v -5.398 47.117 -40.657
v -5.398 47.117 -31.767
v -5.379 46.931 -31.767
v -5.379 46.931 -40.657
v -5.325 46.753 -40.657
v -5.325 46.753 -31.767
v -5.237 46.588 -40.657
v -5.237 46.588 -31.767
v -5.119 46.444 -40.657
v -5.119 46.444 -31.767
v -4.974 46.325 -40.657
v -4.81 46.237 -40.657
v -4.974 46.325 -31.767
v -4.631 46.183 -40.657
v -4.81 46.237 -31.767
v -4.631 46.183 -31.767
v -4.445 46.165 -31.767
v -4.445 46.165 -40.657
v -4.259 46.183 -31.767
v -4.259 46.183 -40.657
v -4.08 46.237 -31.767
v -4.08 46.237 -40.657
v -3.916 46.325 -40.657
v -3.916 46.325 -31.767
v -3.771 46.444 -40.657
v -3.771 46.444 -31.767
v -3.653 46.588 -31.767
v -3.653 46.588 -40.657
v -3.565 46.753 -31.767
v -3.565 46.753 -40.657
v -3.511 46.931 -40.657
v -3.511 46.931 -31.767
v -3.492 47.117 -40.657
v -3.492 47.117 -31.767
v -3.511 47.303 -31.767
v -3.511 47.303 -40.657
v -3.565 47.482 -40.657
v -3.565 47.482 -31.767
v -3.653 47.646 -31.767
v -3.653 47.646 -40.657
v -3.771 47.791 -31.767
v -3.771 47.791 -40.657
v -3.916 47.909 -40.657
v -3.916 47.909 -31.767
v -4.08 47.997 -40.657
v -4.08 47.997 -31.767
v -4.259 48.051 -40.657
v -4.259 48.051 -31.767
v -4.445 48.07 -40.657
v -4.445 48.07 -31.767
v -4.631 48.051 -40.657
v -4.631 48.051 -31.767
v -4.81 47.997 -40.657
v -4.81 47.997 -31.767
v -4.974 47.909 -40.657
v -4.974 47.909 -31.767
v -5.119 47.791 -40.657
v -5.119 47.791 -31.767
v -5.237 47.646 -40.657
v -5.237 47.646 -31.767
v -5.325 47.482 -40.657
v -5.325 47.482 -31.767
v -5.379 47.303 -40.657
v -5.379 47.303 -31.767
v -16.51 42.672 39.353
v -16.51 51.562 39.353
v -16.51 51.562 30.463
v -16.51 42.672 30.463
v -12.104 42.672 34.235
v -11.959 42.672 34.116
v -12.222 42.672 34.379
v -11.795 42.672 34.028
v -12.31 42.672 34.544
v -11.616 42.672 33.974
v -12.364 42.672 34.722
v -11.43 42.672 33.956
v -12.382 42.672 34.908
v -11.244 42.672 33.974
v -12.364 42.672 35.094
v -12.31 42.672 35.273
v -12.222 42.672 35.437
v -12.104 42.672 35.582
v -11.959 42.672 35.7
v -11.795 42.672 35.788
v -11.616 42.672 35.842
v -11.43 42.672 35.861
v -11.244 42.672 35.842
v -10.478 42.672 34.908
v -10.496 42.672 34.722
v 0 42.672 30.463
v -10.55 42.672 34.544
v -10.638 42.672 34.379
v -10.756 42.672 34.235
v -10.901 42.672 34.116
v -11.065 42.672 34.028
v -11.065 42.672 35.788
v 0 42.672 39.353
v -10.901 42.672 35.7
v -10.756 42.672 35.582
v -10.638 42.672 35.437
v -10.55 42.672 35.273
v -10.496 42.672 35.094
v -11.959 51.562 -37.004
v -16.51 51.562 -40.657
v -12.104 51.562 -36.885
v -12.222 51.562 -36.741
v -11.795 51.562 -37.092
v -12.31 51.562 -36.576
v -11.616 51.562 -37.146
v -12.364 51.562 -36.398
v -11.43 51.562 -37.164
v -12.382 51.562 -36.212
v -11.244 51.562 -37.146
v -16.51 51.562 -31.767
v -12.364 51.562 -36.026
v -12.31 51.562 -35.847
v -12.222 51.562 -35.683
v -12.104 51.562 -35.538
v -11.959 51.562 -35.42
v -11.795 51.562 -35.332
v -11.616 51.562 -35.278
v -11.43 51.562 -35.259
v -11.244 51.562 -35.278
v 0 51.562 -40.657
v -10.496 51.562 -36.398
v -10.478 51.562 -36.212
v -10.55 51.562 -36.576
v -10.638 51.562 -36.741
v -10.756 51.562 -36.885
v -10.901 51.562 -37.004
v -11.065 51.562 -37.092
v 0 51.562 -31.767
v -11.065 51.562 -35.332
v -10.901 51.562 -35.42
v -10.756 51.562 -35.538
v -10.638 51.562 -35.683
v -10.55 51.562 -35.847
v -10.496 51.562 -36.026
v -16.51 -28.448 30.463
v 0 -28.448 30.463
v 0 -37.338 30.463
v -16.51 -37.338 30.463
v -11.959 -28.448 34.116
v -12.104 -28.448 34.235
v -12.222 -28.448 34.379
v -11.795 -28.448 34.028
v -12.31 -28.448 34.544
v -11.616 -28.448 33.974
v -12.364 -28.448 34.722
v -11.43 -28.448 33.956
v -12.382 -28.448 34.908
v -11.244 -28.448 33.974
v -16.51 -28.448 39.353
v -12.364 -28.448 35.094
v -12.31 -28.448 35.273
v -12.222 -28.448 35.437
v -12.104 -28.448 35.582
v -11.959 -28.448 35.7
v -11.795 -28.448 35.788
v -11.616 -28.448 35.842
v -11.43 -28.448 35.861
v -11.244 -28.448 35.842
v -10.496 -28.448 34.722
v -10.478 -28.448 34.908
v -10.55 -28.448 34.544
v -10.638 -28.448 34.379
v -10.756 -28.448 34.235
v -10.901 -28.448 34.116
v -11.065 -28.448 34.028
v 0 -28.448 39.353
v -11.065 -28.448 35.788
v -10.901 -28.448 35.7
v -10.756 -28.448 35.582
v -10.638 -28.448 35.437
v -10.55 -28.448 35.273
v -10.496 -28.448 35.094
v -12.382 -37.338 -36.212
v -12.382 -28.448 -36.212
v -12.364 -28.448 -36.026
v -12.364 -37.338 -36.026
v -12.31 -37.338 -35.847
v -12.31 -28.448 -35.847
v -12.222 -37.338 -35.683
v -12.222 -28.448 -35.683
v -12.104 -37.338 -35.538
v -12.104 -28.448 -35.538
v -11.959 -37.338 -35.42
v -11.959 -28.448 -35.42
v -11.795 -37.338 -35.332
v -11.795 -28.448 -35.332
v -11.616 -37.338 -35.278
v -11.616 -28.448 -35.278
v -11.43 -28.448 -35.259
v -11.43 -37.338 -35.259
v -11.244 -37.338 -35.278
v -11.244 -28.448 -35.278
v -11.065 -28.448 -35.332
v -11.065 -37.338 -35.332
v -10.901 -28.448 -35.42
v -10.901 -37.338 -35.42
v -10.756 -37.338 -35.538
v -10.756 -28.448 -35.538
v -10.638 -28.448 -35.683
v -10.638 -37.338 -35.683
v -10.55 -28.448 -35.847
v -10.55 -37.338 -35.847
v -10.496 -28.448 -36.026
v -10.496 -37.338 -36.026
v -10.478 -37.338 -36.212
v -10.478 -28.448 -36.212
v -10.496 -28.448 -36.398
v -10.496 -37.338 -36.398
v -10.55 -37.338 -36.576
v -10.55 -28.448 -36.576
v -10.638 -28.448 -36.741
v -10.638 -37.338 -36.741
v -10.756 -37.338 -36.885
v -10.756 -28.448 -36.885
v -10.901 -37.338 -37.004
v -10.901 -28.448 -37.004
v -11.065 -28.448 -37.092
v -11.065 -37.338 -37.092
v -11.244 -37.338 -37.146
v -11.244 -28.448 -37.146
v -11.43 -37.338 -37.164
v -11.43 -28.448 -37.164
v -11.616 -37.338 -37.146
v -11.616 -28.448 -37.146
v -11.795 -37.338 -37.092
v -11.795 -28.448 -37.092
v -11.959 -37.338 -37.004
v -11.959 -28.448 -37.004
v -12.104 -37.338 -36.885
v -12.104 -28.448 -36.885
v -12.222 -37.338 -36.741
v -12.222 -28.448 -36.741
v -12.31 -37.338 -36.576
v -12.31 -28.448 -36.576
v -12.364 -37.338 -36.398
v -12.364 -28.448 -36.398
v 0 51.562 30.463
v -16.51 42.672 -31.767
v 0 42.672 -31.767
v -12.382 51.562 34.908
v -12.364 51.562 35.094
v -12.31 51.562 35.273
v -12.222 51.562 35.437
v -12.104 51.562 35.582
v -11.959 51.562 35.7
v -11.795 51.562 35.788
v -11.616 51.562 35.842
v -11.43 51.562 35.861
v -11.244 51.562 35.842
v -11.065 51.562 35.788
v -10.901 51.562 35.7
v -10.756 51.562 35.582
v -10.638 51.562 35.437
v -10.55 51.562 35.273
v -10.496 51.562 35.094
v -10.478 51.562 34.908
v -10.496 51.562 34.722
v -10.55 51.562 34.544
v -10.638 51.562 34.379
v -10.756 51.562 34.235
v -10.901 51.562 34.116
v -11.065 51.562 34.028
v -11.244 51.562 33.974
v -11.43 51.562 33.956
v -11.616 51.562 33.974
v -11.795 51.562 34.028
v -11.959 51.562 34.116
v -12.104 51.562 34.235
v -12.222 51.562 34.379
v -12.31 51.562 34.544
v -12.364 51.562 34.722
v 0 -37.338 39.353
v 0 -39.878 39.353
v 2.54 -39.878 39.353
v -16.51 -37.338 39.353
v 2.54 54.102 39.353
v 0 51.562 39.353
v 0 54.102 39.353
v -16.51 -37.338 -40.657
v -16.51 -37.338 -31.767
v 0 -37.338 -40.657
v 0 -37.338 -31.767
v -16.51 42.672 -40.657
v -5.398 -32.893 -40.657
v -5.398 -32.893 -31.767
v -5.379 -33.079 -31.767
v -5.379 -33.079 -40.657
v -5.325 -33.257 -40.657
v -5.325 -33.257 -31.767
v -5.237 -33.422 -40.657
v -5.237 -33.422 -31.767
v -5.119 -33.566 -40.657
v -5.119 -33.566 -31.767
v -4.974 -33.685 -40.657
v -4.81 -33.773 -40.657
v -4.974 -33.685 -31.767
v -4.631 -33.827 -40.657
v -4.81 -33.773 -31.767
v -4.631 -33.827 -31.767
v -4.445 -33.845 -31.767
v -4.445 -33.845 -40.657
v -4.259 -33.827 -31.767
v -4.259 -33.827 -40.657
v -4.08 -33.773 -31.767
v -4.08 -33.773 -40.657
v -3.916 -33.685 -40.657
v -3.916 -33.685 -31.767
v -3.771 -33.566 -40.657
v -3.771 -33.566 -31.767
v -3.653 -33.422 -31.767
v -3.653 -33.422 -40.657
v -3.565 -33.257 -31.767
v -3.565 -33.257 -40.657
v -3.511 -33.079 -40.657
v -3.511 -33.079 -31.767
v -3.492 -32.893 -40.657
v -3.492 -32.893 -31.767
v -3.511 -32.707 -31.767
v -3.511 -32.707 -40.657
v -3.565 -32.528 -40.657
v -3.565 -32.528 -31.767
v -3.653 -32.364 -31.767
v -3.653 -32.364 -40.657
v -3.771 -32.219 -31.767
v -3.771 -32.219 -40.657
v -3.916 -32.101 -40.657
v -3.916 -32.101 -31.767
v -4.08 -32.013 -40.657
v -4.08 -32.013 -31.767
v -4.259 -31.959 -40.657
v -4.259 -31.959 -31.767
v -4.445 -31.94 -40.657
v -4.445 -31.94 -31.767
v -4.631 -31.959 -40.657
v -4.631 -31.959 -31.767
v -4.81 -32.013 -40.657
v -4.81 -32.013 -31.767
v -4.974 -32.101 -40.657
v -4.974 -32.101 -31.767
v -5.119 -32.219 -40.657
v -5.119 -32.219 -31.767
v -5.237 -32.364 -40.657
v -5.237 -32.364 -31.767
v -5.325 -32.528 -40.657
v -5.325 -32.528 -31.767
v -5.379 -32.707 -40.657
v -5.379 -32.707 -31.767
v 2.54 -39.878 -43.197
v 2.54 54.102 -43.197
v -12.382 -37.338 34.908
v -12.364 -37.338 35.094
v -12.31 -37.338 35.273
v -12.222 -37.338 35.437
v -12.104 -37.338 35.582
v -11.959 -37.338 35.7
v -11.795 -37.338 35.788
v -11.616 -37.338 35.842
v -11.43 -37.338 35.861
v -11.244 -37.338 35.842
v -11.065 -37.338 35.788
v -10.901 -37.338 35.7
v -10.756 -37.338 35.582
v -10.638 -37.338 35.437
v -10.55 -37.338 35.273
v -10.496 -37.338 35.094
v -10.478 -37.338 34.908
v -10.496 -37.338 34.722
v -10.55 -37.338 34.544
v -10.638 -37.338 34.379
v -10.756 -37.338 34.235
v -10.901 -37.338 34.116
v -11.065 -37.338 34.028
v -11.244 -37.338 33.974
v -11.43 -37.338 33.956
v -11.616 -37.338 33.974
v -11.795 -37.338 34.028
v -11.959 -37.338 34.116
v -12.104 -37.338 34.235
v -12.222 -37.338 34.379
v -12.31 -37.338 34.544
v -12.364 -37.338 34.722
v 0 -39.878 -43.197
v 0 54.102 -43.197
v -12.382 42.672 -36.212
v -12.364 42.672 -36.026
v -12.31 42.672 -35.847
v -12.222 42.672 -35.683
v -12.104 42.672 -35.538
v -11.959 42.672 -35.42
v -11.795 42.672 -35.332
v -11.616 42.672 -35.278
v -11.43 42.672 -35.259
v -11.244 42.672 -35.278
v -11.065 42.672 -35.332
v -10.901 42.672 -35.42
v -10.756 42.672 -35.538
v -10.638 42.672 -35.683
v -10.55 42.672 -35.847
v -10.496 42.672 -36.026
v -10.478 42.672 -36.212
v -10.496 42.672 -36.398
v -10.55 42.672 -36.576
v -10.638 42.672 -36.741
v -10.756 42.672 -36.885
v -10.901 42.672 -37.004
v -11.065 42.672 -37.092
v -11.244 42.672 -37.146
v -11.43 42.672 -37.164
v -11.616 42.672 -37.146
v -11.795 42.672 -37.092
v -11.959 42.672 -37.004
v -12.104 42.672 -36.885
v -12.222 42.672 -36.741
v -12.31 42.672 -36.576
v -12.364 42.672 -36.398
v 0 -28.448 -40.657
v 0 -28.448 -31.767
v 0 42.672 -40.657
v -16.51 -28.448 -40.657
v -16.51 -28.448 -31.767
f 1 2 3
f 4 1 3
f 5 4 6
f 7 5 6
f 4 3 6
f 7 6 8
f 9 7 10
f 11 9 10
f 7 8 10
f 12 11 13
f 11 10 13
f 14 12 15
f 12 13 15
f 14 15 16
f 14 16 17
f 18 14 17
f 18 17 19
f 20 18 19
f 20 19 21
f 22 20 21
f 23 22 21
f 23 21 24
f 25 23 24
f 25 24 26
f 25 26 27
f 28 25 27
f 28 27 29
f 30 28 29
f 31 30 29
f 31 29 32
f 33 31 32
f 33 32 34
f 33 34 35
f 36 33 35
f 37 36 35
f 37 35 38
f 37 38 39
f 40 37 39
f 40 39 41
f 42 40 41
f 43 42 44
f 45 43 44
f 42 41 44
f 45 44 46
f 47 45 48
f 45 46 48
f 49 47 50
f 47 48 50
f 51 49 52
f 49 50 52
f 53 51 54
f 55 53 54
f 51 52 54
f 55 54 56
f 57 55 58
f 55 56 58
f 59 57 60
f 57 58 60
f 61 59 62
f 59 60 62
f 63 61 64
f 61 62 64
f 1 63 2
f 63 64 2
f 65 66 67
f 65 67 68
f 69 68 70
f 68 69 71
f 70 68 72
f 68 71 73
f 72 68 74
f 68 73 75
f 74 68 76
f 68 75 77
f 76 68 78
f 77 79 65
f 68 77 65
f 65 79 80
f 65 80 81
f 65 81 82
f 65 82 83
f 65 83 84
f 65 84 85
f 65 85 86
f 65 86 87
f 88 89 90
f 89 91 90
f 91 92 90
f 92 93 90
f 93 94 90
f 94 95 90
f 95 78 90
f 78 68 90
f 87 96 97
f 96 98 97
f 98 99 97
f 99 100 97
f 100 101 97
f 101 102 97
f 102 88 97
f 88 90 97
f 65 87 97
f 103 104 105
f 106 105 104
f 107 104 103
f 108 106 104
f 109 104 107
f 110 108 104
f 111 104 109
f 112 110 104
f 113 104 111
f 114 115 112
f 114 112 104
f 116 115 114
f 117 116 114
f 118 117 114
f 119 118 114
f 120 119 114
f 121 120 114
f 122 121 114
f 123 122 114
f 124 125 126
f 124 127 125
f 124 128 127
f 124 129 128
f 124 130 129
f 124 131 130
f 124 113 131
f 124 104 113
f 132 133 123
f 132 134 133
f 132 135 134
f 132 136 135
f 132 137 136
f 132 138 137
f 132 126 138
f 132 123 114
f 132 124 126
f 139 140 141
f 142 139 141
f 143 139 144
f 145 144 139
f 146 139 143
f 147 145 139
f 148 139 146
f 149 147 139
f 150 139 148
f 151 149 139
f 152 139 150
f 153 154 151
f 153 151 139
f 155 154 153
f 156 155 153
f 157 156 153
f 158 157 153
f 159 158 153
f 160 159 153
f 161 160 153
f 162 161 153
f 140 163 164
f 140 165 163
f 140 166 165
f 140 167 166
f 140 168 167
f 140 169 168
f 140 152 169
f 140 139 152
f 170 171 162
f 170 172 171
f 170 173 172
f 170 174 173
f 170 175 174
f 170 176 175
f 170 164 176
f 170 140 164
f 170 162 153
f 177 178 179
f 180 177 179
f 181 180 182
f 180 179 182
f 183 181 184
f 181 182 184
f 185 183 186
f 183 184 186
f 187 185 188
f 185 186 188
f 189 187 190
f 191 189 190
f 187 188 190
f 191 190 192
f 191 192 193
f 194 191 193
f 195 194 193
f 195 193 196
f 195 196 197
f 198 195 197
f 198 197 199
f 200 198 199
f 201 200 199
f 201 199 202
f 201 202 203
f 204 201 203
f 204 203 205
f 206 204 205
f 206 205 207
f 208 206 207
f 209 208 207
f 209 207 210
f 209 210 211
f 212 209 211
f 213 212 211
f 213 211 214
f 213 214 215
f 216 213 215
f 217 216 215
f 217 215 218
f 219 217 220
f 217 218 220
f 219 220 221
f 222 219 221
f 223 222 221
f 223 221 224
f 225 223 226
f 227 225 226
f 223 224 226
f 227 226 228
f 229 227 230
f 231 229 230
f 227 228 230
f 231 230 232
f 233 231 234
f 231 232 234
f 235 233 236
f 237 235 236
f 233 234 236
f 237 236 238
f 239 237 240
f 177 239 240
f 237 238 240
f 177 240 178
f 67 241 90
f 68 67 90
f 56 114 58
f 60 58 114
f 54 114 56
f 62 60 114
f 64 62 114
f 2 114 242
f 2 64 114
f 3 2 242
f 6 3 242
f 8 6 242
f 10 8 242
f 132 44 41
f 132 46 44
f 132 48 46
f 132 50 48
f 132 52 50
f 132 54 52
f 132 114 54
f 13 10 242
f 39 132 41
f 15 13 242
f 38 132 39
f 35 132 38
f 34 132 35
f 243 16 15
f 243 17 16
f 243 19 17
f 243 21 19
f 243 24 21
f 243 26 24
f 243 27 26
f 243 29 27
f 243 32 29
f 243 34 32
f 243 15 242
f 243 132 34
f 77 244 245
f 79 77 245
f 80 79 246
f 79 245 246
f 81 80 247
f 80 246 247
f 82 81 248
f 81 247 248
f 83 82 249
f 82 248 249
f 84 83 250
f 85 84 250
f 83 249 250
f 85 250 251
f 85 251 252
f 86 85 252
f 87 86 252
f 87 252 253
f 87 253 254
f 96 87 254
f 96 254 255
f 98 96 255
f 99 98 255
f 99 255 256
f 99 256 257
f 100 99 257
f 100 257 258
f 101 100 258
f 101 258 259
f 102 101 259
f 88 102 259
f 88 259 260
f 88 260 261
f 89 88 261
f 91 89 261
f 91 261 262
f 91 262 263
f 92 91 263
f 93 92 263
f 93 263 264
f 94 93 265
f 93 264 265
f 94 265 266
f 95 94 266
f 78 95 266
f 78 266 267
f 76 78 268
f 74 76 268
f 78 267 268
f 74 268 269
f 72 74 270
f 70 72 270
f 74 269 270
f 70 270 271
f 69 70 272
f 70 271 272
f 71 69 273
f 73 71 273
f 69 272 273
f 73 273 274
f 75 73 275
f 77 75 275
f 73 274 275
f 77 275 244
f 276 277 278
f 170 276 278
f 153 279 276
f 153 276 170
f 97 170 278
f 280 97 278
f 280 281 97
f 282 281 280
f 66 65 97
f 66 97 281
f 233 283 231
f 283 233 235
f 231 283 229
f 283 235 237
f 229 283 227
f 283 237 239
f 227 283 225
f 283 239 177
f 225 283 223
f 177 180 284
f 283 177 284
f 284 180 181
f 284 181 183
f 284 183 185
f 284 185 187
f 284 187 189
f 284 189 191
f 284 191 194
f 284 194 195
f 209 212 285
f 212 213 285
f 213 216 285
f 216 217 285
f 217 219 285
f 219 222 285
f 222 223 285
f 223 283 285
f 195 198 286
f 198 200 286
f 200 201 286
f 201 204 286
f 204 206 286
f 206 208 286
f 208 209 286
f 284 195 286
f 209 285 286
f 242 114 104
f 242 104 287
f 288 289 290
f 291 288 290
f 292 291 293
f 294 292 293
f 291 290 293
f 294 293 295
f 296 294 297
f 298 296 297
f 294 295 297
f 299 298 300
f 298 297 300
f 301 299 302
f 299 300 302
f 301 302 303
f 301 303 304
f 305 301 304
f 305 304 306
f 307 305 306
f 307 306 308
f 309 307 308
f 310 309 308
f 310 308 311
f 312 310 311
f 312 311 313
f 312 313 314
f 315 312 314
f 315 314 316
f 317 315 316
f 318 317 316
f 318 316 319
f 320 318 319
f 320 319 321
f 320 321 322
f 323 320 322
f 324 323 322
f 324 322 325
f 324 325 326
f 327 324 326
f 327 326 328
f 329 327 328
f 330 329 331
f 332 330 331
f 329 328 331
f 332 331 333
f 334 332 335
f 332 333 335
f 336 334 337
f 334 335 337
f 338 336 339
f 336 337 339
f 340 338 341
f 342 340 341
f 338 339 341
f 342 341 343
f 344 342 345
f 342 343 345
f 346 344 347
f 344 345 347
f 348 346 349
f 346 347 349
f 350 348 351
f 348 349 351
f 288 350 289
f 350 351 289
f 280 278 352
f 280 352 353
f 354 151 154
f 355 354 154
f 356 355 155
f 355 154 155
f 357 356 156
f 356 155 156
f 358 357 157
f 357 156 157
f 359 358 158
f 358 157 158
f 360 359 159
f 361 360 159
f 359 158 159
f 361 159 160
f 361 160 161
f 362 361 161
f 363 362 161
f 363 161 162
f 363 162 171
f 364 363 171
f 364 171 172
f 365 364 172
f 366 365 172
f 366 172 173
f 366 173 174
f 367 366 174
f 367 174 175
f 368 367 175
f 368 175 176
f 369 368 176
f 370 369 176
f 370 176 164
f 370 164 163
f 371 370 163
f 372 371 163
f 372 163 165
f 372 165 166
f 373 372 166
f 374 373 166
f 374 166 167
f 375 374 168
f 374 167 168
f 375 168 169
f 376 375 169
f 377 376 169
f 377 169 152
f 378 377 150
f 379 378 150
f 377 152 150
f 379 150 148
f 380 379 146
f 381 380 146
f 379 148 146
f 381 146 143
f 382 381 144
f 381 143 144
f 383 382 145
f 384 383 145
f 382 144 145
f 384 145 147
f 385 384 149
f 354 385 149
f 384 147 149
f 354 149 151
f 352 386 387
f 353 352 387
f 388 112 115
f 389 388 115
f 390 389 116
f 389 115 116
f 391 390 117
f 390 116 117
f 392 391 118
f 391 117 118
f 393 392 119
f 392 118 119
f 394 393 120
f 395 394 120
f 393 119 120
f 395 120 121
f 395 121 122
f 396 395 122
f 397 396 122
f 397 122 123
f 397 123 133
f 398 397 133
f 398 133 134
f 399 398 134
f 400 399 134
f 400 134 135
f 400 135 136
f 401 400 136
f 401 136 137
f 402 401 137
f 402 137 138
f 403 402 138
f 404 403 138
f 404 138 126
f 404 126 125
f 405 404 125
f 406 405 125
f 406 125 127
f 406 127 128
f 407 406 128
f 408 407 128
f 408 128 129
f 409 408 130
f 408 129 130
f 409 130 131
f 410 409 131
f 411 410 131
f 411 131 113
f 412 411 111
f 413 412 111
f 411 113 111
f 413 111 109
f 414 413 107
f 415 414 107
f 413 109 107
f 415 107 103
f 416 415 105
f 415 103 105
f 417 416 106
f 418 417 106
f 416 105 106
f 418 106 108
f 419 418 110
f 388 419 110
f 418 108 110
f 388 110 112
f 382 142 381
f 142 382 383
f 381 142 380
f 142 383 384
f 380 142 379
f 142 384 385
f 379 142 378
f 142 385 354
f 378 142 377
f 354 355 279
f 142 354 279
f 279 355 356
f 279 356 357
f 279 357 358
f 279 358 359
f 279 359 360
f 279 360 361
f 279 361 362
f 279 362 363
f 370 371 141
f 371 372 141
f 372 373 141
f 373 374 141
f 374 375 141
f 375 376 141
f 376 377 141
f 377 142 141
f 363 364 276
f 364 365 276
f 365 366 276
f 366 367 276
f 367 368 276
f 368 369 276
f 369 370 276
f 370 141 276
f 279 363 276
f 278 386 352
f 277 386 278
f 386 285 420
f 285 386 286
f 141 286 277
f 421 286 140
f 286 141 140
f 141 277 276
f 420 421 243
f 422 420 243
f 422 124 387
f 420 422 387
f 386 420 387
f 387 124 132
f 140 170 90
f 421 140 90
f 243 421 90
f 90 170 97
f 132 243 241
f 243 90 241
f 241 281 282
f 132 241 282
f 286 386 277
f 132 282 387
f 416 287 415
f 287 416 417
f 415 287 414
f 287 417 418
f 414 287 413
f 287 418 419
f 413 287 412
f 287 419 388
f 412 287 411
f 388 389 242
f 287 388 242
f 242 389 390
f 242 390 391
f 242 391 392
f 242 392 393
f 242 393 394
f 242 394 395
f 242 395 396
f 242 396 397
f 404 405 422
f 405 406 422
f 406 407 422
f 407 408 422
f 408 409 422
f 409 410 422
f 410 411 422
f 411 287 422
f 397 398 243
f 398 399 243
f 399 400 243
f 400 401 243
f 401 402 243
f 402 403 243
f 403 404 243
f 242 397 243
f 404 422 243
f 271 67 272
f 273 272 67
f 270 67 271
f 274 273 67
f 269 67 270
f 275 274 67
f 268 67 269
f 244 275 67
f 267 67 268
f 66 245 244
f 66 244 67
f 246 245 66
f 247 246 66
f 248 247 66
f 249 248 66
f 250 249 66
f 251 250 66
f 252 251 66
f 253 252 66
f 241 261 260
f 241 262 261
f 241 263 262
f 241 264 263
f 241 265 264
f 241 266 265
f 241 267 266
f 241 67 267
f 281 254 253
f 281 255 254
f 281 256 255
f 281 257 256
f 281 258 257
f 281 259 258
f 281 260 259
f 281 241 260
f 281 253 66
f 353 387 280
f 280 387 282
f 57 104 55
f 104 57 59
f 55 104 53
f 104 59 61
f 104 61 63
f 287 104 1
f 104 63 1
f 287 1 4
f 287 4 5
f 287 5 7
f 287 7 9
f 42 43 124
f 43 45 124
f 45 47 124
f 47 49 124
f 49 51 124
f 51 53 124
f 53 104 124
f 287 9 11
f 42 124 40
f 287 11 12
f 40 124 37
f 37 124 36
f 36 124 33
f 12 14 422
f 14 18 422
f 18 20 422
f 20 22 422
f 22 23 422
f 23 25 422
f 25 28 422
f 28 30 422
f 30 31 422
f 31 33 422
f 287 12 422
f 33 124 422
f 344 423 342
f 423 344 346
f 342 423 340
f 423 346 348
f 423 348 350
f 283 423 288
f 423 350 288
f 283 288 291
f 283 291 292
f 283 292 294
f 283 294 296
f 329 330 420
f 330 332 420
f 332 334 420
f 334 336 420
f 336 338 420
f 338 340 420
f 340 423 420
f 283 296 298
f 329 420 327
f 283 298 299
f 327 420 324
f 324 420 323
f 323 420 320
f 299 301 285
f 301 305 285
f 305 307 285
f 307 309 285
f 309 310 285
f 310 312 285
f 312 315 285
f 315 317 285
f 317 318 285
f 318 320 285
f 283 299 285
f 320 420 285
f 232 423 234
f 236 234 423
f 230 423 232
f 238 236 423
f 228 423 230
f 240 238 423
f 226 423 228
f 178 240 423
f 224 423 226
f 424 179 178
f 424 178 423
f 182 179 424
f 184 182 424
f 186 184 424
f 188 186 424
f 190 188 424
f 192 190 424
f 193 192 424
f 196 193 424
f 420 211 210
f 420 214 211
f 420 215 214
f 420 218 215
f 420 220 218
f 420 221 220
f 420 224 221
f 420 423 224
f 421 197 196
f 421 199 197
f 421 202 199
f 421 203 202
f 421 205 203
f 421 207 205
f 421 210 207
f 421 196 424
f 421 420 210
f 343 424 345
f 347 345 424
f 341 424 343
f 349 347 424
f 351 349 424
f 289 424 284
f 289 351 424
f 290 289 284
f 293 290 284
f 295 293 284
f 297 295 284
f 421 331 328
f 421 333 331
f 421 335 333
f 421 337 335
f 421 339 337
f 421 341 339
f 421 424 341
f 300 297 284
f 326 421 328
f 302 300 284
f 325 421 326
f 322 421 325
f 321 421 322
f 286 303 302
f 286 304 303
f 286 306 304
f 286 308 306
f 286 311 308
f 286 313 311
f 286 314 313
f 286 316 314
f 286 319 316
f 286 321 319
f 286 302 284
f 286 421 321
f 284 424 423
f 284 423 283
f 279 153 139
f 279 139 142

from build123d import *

# Parameters (mm, degrees)
F0_W     = 93.98
F0_H     = 82.55
F1_DEPTH = 2.54
F2_W     = 8.89
F2_H     = 8.89
F3_DEPTH = 16.51
F6_D     = 1.905
F9_D     = 1.905
F9_DEPTH = 12.7


with BuildPart() as f1:
    # F0 (on Right) → F1 (new body)
    with BuildSketch(Plane.YZ):
        with Locations((7.112141, -1.921732)):
            Rectangle(F0_W, F0_H)
    extrude(amount=F1_DEPTH)

    # F2 (on face) → F3 (join)
    with BuildSketch(Plane(origin=(0, 0, 0), x_dir=(0, -1, 0), z_dir=(-1, 0, 0))):
        with Locations((-47.117141, 34.908268)):
            Rectangle(F2_W, F2_H)
        with Locations((32.892859, 34.908268)):
            Rectangle(F2_W, F2_H)
        with Locations((32.892859, -36.211732)):
            Rectangle(F2_W, F2_H)
        with Locations((-47.117141, -36.211732)):
            Rectangle(F2_W, F2_H)
    extrude(amount=F3_DEPTH)

    # F6 (through all)
    with Locations(Plane.XZ.offset(37.337859)):
        with Locations((-11.43, -36.211732), (-11.43, 34.908268)):
            Hole(F6_D / 2)

    # F9
    with Locations(Plane(origin=(0, 0, -40.656732), x_dir=(1, 0, 0), z_dir=(0, 0, -1))):
        with Locations((-4.445, -47.117141), (-4.445, 32.892859)):
            Hole(F9_D / 2, depth=F9_DEPTH)


solid = f1.part
